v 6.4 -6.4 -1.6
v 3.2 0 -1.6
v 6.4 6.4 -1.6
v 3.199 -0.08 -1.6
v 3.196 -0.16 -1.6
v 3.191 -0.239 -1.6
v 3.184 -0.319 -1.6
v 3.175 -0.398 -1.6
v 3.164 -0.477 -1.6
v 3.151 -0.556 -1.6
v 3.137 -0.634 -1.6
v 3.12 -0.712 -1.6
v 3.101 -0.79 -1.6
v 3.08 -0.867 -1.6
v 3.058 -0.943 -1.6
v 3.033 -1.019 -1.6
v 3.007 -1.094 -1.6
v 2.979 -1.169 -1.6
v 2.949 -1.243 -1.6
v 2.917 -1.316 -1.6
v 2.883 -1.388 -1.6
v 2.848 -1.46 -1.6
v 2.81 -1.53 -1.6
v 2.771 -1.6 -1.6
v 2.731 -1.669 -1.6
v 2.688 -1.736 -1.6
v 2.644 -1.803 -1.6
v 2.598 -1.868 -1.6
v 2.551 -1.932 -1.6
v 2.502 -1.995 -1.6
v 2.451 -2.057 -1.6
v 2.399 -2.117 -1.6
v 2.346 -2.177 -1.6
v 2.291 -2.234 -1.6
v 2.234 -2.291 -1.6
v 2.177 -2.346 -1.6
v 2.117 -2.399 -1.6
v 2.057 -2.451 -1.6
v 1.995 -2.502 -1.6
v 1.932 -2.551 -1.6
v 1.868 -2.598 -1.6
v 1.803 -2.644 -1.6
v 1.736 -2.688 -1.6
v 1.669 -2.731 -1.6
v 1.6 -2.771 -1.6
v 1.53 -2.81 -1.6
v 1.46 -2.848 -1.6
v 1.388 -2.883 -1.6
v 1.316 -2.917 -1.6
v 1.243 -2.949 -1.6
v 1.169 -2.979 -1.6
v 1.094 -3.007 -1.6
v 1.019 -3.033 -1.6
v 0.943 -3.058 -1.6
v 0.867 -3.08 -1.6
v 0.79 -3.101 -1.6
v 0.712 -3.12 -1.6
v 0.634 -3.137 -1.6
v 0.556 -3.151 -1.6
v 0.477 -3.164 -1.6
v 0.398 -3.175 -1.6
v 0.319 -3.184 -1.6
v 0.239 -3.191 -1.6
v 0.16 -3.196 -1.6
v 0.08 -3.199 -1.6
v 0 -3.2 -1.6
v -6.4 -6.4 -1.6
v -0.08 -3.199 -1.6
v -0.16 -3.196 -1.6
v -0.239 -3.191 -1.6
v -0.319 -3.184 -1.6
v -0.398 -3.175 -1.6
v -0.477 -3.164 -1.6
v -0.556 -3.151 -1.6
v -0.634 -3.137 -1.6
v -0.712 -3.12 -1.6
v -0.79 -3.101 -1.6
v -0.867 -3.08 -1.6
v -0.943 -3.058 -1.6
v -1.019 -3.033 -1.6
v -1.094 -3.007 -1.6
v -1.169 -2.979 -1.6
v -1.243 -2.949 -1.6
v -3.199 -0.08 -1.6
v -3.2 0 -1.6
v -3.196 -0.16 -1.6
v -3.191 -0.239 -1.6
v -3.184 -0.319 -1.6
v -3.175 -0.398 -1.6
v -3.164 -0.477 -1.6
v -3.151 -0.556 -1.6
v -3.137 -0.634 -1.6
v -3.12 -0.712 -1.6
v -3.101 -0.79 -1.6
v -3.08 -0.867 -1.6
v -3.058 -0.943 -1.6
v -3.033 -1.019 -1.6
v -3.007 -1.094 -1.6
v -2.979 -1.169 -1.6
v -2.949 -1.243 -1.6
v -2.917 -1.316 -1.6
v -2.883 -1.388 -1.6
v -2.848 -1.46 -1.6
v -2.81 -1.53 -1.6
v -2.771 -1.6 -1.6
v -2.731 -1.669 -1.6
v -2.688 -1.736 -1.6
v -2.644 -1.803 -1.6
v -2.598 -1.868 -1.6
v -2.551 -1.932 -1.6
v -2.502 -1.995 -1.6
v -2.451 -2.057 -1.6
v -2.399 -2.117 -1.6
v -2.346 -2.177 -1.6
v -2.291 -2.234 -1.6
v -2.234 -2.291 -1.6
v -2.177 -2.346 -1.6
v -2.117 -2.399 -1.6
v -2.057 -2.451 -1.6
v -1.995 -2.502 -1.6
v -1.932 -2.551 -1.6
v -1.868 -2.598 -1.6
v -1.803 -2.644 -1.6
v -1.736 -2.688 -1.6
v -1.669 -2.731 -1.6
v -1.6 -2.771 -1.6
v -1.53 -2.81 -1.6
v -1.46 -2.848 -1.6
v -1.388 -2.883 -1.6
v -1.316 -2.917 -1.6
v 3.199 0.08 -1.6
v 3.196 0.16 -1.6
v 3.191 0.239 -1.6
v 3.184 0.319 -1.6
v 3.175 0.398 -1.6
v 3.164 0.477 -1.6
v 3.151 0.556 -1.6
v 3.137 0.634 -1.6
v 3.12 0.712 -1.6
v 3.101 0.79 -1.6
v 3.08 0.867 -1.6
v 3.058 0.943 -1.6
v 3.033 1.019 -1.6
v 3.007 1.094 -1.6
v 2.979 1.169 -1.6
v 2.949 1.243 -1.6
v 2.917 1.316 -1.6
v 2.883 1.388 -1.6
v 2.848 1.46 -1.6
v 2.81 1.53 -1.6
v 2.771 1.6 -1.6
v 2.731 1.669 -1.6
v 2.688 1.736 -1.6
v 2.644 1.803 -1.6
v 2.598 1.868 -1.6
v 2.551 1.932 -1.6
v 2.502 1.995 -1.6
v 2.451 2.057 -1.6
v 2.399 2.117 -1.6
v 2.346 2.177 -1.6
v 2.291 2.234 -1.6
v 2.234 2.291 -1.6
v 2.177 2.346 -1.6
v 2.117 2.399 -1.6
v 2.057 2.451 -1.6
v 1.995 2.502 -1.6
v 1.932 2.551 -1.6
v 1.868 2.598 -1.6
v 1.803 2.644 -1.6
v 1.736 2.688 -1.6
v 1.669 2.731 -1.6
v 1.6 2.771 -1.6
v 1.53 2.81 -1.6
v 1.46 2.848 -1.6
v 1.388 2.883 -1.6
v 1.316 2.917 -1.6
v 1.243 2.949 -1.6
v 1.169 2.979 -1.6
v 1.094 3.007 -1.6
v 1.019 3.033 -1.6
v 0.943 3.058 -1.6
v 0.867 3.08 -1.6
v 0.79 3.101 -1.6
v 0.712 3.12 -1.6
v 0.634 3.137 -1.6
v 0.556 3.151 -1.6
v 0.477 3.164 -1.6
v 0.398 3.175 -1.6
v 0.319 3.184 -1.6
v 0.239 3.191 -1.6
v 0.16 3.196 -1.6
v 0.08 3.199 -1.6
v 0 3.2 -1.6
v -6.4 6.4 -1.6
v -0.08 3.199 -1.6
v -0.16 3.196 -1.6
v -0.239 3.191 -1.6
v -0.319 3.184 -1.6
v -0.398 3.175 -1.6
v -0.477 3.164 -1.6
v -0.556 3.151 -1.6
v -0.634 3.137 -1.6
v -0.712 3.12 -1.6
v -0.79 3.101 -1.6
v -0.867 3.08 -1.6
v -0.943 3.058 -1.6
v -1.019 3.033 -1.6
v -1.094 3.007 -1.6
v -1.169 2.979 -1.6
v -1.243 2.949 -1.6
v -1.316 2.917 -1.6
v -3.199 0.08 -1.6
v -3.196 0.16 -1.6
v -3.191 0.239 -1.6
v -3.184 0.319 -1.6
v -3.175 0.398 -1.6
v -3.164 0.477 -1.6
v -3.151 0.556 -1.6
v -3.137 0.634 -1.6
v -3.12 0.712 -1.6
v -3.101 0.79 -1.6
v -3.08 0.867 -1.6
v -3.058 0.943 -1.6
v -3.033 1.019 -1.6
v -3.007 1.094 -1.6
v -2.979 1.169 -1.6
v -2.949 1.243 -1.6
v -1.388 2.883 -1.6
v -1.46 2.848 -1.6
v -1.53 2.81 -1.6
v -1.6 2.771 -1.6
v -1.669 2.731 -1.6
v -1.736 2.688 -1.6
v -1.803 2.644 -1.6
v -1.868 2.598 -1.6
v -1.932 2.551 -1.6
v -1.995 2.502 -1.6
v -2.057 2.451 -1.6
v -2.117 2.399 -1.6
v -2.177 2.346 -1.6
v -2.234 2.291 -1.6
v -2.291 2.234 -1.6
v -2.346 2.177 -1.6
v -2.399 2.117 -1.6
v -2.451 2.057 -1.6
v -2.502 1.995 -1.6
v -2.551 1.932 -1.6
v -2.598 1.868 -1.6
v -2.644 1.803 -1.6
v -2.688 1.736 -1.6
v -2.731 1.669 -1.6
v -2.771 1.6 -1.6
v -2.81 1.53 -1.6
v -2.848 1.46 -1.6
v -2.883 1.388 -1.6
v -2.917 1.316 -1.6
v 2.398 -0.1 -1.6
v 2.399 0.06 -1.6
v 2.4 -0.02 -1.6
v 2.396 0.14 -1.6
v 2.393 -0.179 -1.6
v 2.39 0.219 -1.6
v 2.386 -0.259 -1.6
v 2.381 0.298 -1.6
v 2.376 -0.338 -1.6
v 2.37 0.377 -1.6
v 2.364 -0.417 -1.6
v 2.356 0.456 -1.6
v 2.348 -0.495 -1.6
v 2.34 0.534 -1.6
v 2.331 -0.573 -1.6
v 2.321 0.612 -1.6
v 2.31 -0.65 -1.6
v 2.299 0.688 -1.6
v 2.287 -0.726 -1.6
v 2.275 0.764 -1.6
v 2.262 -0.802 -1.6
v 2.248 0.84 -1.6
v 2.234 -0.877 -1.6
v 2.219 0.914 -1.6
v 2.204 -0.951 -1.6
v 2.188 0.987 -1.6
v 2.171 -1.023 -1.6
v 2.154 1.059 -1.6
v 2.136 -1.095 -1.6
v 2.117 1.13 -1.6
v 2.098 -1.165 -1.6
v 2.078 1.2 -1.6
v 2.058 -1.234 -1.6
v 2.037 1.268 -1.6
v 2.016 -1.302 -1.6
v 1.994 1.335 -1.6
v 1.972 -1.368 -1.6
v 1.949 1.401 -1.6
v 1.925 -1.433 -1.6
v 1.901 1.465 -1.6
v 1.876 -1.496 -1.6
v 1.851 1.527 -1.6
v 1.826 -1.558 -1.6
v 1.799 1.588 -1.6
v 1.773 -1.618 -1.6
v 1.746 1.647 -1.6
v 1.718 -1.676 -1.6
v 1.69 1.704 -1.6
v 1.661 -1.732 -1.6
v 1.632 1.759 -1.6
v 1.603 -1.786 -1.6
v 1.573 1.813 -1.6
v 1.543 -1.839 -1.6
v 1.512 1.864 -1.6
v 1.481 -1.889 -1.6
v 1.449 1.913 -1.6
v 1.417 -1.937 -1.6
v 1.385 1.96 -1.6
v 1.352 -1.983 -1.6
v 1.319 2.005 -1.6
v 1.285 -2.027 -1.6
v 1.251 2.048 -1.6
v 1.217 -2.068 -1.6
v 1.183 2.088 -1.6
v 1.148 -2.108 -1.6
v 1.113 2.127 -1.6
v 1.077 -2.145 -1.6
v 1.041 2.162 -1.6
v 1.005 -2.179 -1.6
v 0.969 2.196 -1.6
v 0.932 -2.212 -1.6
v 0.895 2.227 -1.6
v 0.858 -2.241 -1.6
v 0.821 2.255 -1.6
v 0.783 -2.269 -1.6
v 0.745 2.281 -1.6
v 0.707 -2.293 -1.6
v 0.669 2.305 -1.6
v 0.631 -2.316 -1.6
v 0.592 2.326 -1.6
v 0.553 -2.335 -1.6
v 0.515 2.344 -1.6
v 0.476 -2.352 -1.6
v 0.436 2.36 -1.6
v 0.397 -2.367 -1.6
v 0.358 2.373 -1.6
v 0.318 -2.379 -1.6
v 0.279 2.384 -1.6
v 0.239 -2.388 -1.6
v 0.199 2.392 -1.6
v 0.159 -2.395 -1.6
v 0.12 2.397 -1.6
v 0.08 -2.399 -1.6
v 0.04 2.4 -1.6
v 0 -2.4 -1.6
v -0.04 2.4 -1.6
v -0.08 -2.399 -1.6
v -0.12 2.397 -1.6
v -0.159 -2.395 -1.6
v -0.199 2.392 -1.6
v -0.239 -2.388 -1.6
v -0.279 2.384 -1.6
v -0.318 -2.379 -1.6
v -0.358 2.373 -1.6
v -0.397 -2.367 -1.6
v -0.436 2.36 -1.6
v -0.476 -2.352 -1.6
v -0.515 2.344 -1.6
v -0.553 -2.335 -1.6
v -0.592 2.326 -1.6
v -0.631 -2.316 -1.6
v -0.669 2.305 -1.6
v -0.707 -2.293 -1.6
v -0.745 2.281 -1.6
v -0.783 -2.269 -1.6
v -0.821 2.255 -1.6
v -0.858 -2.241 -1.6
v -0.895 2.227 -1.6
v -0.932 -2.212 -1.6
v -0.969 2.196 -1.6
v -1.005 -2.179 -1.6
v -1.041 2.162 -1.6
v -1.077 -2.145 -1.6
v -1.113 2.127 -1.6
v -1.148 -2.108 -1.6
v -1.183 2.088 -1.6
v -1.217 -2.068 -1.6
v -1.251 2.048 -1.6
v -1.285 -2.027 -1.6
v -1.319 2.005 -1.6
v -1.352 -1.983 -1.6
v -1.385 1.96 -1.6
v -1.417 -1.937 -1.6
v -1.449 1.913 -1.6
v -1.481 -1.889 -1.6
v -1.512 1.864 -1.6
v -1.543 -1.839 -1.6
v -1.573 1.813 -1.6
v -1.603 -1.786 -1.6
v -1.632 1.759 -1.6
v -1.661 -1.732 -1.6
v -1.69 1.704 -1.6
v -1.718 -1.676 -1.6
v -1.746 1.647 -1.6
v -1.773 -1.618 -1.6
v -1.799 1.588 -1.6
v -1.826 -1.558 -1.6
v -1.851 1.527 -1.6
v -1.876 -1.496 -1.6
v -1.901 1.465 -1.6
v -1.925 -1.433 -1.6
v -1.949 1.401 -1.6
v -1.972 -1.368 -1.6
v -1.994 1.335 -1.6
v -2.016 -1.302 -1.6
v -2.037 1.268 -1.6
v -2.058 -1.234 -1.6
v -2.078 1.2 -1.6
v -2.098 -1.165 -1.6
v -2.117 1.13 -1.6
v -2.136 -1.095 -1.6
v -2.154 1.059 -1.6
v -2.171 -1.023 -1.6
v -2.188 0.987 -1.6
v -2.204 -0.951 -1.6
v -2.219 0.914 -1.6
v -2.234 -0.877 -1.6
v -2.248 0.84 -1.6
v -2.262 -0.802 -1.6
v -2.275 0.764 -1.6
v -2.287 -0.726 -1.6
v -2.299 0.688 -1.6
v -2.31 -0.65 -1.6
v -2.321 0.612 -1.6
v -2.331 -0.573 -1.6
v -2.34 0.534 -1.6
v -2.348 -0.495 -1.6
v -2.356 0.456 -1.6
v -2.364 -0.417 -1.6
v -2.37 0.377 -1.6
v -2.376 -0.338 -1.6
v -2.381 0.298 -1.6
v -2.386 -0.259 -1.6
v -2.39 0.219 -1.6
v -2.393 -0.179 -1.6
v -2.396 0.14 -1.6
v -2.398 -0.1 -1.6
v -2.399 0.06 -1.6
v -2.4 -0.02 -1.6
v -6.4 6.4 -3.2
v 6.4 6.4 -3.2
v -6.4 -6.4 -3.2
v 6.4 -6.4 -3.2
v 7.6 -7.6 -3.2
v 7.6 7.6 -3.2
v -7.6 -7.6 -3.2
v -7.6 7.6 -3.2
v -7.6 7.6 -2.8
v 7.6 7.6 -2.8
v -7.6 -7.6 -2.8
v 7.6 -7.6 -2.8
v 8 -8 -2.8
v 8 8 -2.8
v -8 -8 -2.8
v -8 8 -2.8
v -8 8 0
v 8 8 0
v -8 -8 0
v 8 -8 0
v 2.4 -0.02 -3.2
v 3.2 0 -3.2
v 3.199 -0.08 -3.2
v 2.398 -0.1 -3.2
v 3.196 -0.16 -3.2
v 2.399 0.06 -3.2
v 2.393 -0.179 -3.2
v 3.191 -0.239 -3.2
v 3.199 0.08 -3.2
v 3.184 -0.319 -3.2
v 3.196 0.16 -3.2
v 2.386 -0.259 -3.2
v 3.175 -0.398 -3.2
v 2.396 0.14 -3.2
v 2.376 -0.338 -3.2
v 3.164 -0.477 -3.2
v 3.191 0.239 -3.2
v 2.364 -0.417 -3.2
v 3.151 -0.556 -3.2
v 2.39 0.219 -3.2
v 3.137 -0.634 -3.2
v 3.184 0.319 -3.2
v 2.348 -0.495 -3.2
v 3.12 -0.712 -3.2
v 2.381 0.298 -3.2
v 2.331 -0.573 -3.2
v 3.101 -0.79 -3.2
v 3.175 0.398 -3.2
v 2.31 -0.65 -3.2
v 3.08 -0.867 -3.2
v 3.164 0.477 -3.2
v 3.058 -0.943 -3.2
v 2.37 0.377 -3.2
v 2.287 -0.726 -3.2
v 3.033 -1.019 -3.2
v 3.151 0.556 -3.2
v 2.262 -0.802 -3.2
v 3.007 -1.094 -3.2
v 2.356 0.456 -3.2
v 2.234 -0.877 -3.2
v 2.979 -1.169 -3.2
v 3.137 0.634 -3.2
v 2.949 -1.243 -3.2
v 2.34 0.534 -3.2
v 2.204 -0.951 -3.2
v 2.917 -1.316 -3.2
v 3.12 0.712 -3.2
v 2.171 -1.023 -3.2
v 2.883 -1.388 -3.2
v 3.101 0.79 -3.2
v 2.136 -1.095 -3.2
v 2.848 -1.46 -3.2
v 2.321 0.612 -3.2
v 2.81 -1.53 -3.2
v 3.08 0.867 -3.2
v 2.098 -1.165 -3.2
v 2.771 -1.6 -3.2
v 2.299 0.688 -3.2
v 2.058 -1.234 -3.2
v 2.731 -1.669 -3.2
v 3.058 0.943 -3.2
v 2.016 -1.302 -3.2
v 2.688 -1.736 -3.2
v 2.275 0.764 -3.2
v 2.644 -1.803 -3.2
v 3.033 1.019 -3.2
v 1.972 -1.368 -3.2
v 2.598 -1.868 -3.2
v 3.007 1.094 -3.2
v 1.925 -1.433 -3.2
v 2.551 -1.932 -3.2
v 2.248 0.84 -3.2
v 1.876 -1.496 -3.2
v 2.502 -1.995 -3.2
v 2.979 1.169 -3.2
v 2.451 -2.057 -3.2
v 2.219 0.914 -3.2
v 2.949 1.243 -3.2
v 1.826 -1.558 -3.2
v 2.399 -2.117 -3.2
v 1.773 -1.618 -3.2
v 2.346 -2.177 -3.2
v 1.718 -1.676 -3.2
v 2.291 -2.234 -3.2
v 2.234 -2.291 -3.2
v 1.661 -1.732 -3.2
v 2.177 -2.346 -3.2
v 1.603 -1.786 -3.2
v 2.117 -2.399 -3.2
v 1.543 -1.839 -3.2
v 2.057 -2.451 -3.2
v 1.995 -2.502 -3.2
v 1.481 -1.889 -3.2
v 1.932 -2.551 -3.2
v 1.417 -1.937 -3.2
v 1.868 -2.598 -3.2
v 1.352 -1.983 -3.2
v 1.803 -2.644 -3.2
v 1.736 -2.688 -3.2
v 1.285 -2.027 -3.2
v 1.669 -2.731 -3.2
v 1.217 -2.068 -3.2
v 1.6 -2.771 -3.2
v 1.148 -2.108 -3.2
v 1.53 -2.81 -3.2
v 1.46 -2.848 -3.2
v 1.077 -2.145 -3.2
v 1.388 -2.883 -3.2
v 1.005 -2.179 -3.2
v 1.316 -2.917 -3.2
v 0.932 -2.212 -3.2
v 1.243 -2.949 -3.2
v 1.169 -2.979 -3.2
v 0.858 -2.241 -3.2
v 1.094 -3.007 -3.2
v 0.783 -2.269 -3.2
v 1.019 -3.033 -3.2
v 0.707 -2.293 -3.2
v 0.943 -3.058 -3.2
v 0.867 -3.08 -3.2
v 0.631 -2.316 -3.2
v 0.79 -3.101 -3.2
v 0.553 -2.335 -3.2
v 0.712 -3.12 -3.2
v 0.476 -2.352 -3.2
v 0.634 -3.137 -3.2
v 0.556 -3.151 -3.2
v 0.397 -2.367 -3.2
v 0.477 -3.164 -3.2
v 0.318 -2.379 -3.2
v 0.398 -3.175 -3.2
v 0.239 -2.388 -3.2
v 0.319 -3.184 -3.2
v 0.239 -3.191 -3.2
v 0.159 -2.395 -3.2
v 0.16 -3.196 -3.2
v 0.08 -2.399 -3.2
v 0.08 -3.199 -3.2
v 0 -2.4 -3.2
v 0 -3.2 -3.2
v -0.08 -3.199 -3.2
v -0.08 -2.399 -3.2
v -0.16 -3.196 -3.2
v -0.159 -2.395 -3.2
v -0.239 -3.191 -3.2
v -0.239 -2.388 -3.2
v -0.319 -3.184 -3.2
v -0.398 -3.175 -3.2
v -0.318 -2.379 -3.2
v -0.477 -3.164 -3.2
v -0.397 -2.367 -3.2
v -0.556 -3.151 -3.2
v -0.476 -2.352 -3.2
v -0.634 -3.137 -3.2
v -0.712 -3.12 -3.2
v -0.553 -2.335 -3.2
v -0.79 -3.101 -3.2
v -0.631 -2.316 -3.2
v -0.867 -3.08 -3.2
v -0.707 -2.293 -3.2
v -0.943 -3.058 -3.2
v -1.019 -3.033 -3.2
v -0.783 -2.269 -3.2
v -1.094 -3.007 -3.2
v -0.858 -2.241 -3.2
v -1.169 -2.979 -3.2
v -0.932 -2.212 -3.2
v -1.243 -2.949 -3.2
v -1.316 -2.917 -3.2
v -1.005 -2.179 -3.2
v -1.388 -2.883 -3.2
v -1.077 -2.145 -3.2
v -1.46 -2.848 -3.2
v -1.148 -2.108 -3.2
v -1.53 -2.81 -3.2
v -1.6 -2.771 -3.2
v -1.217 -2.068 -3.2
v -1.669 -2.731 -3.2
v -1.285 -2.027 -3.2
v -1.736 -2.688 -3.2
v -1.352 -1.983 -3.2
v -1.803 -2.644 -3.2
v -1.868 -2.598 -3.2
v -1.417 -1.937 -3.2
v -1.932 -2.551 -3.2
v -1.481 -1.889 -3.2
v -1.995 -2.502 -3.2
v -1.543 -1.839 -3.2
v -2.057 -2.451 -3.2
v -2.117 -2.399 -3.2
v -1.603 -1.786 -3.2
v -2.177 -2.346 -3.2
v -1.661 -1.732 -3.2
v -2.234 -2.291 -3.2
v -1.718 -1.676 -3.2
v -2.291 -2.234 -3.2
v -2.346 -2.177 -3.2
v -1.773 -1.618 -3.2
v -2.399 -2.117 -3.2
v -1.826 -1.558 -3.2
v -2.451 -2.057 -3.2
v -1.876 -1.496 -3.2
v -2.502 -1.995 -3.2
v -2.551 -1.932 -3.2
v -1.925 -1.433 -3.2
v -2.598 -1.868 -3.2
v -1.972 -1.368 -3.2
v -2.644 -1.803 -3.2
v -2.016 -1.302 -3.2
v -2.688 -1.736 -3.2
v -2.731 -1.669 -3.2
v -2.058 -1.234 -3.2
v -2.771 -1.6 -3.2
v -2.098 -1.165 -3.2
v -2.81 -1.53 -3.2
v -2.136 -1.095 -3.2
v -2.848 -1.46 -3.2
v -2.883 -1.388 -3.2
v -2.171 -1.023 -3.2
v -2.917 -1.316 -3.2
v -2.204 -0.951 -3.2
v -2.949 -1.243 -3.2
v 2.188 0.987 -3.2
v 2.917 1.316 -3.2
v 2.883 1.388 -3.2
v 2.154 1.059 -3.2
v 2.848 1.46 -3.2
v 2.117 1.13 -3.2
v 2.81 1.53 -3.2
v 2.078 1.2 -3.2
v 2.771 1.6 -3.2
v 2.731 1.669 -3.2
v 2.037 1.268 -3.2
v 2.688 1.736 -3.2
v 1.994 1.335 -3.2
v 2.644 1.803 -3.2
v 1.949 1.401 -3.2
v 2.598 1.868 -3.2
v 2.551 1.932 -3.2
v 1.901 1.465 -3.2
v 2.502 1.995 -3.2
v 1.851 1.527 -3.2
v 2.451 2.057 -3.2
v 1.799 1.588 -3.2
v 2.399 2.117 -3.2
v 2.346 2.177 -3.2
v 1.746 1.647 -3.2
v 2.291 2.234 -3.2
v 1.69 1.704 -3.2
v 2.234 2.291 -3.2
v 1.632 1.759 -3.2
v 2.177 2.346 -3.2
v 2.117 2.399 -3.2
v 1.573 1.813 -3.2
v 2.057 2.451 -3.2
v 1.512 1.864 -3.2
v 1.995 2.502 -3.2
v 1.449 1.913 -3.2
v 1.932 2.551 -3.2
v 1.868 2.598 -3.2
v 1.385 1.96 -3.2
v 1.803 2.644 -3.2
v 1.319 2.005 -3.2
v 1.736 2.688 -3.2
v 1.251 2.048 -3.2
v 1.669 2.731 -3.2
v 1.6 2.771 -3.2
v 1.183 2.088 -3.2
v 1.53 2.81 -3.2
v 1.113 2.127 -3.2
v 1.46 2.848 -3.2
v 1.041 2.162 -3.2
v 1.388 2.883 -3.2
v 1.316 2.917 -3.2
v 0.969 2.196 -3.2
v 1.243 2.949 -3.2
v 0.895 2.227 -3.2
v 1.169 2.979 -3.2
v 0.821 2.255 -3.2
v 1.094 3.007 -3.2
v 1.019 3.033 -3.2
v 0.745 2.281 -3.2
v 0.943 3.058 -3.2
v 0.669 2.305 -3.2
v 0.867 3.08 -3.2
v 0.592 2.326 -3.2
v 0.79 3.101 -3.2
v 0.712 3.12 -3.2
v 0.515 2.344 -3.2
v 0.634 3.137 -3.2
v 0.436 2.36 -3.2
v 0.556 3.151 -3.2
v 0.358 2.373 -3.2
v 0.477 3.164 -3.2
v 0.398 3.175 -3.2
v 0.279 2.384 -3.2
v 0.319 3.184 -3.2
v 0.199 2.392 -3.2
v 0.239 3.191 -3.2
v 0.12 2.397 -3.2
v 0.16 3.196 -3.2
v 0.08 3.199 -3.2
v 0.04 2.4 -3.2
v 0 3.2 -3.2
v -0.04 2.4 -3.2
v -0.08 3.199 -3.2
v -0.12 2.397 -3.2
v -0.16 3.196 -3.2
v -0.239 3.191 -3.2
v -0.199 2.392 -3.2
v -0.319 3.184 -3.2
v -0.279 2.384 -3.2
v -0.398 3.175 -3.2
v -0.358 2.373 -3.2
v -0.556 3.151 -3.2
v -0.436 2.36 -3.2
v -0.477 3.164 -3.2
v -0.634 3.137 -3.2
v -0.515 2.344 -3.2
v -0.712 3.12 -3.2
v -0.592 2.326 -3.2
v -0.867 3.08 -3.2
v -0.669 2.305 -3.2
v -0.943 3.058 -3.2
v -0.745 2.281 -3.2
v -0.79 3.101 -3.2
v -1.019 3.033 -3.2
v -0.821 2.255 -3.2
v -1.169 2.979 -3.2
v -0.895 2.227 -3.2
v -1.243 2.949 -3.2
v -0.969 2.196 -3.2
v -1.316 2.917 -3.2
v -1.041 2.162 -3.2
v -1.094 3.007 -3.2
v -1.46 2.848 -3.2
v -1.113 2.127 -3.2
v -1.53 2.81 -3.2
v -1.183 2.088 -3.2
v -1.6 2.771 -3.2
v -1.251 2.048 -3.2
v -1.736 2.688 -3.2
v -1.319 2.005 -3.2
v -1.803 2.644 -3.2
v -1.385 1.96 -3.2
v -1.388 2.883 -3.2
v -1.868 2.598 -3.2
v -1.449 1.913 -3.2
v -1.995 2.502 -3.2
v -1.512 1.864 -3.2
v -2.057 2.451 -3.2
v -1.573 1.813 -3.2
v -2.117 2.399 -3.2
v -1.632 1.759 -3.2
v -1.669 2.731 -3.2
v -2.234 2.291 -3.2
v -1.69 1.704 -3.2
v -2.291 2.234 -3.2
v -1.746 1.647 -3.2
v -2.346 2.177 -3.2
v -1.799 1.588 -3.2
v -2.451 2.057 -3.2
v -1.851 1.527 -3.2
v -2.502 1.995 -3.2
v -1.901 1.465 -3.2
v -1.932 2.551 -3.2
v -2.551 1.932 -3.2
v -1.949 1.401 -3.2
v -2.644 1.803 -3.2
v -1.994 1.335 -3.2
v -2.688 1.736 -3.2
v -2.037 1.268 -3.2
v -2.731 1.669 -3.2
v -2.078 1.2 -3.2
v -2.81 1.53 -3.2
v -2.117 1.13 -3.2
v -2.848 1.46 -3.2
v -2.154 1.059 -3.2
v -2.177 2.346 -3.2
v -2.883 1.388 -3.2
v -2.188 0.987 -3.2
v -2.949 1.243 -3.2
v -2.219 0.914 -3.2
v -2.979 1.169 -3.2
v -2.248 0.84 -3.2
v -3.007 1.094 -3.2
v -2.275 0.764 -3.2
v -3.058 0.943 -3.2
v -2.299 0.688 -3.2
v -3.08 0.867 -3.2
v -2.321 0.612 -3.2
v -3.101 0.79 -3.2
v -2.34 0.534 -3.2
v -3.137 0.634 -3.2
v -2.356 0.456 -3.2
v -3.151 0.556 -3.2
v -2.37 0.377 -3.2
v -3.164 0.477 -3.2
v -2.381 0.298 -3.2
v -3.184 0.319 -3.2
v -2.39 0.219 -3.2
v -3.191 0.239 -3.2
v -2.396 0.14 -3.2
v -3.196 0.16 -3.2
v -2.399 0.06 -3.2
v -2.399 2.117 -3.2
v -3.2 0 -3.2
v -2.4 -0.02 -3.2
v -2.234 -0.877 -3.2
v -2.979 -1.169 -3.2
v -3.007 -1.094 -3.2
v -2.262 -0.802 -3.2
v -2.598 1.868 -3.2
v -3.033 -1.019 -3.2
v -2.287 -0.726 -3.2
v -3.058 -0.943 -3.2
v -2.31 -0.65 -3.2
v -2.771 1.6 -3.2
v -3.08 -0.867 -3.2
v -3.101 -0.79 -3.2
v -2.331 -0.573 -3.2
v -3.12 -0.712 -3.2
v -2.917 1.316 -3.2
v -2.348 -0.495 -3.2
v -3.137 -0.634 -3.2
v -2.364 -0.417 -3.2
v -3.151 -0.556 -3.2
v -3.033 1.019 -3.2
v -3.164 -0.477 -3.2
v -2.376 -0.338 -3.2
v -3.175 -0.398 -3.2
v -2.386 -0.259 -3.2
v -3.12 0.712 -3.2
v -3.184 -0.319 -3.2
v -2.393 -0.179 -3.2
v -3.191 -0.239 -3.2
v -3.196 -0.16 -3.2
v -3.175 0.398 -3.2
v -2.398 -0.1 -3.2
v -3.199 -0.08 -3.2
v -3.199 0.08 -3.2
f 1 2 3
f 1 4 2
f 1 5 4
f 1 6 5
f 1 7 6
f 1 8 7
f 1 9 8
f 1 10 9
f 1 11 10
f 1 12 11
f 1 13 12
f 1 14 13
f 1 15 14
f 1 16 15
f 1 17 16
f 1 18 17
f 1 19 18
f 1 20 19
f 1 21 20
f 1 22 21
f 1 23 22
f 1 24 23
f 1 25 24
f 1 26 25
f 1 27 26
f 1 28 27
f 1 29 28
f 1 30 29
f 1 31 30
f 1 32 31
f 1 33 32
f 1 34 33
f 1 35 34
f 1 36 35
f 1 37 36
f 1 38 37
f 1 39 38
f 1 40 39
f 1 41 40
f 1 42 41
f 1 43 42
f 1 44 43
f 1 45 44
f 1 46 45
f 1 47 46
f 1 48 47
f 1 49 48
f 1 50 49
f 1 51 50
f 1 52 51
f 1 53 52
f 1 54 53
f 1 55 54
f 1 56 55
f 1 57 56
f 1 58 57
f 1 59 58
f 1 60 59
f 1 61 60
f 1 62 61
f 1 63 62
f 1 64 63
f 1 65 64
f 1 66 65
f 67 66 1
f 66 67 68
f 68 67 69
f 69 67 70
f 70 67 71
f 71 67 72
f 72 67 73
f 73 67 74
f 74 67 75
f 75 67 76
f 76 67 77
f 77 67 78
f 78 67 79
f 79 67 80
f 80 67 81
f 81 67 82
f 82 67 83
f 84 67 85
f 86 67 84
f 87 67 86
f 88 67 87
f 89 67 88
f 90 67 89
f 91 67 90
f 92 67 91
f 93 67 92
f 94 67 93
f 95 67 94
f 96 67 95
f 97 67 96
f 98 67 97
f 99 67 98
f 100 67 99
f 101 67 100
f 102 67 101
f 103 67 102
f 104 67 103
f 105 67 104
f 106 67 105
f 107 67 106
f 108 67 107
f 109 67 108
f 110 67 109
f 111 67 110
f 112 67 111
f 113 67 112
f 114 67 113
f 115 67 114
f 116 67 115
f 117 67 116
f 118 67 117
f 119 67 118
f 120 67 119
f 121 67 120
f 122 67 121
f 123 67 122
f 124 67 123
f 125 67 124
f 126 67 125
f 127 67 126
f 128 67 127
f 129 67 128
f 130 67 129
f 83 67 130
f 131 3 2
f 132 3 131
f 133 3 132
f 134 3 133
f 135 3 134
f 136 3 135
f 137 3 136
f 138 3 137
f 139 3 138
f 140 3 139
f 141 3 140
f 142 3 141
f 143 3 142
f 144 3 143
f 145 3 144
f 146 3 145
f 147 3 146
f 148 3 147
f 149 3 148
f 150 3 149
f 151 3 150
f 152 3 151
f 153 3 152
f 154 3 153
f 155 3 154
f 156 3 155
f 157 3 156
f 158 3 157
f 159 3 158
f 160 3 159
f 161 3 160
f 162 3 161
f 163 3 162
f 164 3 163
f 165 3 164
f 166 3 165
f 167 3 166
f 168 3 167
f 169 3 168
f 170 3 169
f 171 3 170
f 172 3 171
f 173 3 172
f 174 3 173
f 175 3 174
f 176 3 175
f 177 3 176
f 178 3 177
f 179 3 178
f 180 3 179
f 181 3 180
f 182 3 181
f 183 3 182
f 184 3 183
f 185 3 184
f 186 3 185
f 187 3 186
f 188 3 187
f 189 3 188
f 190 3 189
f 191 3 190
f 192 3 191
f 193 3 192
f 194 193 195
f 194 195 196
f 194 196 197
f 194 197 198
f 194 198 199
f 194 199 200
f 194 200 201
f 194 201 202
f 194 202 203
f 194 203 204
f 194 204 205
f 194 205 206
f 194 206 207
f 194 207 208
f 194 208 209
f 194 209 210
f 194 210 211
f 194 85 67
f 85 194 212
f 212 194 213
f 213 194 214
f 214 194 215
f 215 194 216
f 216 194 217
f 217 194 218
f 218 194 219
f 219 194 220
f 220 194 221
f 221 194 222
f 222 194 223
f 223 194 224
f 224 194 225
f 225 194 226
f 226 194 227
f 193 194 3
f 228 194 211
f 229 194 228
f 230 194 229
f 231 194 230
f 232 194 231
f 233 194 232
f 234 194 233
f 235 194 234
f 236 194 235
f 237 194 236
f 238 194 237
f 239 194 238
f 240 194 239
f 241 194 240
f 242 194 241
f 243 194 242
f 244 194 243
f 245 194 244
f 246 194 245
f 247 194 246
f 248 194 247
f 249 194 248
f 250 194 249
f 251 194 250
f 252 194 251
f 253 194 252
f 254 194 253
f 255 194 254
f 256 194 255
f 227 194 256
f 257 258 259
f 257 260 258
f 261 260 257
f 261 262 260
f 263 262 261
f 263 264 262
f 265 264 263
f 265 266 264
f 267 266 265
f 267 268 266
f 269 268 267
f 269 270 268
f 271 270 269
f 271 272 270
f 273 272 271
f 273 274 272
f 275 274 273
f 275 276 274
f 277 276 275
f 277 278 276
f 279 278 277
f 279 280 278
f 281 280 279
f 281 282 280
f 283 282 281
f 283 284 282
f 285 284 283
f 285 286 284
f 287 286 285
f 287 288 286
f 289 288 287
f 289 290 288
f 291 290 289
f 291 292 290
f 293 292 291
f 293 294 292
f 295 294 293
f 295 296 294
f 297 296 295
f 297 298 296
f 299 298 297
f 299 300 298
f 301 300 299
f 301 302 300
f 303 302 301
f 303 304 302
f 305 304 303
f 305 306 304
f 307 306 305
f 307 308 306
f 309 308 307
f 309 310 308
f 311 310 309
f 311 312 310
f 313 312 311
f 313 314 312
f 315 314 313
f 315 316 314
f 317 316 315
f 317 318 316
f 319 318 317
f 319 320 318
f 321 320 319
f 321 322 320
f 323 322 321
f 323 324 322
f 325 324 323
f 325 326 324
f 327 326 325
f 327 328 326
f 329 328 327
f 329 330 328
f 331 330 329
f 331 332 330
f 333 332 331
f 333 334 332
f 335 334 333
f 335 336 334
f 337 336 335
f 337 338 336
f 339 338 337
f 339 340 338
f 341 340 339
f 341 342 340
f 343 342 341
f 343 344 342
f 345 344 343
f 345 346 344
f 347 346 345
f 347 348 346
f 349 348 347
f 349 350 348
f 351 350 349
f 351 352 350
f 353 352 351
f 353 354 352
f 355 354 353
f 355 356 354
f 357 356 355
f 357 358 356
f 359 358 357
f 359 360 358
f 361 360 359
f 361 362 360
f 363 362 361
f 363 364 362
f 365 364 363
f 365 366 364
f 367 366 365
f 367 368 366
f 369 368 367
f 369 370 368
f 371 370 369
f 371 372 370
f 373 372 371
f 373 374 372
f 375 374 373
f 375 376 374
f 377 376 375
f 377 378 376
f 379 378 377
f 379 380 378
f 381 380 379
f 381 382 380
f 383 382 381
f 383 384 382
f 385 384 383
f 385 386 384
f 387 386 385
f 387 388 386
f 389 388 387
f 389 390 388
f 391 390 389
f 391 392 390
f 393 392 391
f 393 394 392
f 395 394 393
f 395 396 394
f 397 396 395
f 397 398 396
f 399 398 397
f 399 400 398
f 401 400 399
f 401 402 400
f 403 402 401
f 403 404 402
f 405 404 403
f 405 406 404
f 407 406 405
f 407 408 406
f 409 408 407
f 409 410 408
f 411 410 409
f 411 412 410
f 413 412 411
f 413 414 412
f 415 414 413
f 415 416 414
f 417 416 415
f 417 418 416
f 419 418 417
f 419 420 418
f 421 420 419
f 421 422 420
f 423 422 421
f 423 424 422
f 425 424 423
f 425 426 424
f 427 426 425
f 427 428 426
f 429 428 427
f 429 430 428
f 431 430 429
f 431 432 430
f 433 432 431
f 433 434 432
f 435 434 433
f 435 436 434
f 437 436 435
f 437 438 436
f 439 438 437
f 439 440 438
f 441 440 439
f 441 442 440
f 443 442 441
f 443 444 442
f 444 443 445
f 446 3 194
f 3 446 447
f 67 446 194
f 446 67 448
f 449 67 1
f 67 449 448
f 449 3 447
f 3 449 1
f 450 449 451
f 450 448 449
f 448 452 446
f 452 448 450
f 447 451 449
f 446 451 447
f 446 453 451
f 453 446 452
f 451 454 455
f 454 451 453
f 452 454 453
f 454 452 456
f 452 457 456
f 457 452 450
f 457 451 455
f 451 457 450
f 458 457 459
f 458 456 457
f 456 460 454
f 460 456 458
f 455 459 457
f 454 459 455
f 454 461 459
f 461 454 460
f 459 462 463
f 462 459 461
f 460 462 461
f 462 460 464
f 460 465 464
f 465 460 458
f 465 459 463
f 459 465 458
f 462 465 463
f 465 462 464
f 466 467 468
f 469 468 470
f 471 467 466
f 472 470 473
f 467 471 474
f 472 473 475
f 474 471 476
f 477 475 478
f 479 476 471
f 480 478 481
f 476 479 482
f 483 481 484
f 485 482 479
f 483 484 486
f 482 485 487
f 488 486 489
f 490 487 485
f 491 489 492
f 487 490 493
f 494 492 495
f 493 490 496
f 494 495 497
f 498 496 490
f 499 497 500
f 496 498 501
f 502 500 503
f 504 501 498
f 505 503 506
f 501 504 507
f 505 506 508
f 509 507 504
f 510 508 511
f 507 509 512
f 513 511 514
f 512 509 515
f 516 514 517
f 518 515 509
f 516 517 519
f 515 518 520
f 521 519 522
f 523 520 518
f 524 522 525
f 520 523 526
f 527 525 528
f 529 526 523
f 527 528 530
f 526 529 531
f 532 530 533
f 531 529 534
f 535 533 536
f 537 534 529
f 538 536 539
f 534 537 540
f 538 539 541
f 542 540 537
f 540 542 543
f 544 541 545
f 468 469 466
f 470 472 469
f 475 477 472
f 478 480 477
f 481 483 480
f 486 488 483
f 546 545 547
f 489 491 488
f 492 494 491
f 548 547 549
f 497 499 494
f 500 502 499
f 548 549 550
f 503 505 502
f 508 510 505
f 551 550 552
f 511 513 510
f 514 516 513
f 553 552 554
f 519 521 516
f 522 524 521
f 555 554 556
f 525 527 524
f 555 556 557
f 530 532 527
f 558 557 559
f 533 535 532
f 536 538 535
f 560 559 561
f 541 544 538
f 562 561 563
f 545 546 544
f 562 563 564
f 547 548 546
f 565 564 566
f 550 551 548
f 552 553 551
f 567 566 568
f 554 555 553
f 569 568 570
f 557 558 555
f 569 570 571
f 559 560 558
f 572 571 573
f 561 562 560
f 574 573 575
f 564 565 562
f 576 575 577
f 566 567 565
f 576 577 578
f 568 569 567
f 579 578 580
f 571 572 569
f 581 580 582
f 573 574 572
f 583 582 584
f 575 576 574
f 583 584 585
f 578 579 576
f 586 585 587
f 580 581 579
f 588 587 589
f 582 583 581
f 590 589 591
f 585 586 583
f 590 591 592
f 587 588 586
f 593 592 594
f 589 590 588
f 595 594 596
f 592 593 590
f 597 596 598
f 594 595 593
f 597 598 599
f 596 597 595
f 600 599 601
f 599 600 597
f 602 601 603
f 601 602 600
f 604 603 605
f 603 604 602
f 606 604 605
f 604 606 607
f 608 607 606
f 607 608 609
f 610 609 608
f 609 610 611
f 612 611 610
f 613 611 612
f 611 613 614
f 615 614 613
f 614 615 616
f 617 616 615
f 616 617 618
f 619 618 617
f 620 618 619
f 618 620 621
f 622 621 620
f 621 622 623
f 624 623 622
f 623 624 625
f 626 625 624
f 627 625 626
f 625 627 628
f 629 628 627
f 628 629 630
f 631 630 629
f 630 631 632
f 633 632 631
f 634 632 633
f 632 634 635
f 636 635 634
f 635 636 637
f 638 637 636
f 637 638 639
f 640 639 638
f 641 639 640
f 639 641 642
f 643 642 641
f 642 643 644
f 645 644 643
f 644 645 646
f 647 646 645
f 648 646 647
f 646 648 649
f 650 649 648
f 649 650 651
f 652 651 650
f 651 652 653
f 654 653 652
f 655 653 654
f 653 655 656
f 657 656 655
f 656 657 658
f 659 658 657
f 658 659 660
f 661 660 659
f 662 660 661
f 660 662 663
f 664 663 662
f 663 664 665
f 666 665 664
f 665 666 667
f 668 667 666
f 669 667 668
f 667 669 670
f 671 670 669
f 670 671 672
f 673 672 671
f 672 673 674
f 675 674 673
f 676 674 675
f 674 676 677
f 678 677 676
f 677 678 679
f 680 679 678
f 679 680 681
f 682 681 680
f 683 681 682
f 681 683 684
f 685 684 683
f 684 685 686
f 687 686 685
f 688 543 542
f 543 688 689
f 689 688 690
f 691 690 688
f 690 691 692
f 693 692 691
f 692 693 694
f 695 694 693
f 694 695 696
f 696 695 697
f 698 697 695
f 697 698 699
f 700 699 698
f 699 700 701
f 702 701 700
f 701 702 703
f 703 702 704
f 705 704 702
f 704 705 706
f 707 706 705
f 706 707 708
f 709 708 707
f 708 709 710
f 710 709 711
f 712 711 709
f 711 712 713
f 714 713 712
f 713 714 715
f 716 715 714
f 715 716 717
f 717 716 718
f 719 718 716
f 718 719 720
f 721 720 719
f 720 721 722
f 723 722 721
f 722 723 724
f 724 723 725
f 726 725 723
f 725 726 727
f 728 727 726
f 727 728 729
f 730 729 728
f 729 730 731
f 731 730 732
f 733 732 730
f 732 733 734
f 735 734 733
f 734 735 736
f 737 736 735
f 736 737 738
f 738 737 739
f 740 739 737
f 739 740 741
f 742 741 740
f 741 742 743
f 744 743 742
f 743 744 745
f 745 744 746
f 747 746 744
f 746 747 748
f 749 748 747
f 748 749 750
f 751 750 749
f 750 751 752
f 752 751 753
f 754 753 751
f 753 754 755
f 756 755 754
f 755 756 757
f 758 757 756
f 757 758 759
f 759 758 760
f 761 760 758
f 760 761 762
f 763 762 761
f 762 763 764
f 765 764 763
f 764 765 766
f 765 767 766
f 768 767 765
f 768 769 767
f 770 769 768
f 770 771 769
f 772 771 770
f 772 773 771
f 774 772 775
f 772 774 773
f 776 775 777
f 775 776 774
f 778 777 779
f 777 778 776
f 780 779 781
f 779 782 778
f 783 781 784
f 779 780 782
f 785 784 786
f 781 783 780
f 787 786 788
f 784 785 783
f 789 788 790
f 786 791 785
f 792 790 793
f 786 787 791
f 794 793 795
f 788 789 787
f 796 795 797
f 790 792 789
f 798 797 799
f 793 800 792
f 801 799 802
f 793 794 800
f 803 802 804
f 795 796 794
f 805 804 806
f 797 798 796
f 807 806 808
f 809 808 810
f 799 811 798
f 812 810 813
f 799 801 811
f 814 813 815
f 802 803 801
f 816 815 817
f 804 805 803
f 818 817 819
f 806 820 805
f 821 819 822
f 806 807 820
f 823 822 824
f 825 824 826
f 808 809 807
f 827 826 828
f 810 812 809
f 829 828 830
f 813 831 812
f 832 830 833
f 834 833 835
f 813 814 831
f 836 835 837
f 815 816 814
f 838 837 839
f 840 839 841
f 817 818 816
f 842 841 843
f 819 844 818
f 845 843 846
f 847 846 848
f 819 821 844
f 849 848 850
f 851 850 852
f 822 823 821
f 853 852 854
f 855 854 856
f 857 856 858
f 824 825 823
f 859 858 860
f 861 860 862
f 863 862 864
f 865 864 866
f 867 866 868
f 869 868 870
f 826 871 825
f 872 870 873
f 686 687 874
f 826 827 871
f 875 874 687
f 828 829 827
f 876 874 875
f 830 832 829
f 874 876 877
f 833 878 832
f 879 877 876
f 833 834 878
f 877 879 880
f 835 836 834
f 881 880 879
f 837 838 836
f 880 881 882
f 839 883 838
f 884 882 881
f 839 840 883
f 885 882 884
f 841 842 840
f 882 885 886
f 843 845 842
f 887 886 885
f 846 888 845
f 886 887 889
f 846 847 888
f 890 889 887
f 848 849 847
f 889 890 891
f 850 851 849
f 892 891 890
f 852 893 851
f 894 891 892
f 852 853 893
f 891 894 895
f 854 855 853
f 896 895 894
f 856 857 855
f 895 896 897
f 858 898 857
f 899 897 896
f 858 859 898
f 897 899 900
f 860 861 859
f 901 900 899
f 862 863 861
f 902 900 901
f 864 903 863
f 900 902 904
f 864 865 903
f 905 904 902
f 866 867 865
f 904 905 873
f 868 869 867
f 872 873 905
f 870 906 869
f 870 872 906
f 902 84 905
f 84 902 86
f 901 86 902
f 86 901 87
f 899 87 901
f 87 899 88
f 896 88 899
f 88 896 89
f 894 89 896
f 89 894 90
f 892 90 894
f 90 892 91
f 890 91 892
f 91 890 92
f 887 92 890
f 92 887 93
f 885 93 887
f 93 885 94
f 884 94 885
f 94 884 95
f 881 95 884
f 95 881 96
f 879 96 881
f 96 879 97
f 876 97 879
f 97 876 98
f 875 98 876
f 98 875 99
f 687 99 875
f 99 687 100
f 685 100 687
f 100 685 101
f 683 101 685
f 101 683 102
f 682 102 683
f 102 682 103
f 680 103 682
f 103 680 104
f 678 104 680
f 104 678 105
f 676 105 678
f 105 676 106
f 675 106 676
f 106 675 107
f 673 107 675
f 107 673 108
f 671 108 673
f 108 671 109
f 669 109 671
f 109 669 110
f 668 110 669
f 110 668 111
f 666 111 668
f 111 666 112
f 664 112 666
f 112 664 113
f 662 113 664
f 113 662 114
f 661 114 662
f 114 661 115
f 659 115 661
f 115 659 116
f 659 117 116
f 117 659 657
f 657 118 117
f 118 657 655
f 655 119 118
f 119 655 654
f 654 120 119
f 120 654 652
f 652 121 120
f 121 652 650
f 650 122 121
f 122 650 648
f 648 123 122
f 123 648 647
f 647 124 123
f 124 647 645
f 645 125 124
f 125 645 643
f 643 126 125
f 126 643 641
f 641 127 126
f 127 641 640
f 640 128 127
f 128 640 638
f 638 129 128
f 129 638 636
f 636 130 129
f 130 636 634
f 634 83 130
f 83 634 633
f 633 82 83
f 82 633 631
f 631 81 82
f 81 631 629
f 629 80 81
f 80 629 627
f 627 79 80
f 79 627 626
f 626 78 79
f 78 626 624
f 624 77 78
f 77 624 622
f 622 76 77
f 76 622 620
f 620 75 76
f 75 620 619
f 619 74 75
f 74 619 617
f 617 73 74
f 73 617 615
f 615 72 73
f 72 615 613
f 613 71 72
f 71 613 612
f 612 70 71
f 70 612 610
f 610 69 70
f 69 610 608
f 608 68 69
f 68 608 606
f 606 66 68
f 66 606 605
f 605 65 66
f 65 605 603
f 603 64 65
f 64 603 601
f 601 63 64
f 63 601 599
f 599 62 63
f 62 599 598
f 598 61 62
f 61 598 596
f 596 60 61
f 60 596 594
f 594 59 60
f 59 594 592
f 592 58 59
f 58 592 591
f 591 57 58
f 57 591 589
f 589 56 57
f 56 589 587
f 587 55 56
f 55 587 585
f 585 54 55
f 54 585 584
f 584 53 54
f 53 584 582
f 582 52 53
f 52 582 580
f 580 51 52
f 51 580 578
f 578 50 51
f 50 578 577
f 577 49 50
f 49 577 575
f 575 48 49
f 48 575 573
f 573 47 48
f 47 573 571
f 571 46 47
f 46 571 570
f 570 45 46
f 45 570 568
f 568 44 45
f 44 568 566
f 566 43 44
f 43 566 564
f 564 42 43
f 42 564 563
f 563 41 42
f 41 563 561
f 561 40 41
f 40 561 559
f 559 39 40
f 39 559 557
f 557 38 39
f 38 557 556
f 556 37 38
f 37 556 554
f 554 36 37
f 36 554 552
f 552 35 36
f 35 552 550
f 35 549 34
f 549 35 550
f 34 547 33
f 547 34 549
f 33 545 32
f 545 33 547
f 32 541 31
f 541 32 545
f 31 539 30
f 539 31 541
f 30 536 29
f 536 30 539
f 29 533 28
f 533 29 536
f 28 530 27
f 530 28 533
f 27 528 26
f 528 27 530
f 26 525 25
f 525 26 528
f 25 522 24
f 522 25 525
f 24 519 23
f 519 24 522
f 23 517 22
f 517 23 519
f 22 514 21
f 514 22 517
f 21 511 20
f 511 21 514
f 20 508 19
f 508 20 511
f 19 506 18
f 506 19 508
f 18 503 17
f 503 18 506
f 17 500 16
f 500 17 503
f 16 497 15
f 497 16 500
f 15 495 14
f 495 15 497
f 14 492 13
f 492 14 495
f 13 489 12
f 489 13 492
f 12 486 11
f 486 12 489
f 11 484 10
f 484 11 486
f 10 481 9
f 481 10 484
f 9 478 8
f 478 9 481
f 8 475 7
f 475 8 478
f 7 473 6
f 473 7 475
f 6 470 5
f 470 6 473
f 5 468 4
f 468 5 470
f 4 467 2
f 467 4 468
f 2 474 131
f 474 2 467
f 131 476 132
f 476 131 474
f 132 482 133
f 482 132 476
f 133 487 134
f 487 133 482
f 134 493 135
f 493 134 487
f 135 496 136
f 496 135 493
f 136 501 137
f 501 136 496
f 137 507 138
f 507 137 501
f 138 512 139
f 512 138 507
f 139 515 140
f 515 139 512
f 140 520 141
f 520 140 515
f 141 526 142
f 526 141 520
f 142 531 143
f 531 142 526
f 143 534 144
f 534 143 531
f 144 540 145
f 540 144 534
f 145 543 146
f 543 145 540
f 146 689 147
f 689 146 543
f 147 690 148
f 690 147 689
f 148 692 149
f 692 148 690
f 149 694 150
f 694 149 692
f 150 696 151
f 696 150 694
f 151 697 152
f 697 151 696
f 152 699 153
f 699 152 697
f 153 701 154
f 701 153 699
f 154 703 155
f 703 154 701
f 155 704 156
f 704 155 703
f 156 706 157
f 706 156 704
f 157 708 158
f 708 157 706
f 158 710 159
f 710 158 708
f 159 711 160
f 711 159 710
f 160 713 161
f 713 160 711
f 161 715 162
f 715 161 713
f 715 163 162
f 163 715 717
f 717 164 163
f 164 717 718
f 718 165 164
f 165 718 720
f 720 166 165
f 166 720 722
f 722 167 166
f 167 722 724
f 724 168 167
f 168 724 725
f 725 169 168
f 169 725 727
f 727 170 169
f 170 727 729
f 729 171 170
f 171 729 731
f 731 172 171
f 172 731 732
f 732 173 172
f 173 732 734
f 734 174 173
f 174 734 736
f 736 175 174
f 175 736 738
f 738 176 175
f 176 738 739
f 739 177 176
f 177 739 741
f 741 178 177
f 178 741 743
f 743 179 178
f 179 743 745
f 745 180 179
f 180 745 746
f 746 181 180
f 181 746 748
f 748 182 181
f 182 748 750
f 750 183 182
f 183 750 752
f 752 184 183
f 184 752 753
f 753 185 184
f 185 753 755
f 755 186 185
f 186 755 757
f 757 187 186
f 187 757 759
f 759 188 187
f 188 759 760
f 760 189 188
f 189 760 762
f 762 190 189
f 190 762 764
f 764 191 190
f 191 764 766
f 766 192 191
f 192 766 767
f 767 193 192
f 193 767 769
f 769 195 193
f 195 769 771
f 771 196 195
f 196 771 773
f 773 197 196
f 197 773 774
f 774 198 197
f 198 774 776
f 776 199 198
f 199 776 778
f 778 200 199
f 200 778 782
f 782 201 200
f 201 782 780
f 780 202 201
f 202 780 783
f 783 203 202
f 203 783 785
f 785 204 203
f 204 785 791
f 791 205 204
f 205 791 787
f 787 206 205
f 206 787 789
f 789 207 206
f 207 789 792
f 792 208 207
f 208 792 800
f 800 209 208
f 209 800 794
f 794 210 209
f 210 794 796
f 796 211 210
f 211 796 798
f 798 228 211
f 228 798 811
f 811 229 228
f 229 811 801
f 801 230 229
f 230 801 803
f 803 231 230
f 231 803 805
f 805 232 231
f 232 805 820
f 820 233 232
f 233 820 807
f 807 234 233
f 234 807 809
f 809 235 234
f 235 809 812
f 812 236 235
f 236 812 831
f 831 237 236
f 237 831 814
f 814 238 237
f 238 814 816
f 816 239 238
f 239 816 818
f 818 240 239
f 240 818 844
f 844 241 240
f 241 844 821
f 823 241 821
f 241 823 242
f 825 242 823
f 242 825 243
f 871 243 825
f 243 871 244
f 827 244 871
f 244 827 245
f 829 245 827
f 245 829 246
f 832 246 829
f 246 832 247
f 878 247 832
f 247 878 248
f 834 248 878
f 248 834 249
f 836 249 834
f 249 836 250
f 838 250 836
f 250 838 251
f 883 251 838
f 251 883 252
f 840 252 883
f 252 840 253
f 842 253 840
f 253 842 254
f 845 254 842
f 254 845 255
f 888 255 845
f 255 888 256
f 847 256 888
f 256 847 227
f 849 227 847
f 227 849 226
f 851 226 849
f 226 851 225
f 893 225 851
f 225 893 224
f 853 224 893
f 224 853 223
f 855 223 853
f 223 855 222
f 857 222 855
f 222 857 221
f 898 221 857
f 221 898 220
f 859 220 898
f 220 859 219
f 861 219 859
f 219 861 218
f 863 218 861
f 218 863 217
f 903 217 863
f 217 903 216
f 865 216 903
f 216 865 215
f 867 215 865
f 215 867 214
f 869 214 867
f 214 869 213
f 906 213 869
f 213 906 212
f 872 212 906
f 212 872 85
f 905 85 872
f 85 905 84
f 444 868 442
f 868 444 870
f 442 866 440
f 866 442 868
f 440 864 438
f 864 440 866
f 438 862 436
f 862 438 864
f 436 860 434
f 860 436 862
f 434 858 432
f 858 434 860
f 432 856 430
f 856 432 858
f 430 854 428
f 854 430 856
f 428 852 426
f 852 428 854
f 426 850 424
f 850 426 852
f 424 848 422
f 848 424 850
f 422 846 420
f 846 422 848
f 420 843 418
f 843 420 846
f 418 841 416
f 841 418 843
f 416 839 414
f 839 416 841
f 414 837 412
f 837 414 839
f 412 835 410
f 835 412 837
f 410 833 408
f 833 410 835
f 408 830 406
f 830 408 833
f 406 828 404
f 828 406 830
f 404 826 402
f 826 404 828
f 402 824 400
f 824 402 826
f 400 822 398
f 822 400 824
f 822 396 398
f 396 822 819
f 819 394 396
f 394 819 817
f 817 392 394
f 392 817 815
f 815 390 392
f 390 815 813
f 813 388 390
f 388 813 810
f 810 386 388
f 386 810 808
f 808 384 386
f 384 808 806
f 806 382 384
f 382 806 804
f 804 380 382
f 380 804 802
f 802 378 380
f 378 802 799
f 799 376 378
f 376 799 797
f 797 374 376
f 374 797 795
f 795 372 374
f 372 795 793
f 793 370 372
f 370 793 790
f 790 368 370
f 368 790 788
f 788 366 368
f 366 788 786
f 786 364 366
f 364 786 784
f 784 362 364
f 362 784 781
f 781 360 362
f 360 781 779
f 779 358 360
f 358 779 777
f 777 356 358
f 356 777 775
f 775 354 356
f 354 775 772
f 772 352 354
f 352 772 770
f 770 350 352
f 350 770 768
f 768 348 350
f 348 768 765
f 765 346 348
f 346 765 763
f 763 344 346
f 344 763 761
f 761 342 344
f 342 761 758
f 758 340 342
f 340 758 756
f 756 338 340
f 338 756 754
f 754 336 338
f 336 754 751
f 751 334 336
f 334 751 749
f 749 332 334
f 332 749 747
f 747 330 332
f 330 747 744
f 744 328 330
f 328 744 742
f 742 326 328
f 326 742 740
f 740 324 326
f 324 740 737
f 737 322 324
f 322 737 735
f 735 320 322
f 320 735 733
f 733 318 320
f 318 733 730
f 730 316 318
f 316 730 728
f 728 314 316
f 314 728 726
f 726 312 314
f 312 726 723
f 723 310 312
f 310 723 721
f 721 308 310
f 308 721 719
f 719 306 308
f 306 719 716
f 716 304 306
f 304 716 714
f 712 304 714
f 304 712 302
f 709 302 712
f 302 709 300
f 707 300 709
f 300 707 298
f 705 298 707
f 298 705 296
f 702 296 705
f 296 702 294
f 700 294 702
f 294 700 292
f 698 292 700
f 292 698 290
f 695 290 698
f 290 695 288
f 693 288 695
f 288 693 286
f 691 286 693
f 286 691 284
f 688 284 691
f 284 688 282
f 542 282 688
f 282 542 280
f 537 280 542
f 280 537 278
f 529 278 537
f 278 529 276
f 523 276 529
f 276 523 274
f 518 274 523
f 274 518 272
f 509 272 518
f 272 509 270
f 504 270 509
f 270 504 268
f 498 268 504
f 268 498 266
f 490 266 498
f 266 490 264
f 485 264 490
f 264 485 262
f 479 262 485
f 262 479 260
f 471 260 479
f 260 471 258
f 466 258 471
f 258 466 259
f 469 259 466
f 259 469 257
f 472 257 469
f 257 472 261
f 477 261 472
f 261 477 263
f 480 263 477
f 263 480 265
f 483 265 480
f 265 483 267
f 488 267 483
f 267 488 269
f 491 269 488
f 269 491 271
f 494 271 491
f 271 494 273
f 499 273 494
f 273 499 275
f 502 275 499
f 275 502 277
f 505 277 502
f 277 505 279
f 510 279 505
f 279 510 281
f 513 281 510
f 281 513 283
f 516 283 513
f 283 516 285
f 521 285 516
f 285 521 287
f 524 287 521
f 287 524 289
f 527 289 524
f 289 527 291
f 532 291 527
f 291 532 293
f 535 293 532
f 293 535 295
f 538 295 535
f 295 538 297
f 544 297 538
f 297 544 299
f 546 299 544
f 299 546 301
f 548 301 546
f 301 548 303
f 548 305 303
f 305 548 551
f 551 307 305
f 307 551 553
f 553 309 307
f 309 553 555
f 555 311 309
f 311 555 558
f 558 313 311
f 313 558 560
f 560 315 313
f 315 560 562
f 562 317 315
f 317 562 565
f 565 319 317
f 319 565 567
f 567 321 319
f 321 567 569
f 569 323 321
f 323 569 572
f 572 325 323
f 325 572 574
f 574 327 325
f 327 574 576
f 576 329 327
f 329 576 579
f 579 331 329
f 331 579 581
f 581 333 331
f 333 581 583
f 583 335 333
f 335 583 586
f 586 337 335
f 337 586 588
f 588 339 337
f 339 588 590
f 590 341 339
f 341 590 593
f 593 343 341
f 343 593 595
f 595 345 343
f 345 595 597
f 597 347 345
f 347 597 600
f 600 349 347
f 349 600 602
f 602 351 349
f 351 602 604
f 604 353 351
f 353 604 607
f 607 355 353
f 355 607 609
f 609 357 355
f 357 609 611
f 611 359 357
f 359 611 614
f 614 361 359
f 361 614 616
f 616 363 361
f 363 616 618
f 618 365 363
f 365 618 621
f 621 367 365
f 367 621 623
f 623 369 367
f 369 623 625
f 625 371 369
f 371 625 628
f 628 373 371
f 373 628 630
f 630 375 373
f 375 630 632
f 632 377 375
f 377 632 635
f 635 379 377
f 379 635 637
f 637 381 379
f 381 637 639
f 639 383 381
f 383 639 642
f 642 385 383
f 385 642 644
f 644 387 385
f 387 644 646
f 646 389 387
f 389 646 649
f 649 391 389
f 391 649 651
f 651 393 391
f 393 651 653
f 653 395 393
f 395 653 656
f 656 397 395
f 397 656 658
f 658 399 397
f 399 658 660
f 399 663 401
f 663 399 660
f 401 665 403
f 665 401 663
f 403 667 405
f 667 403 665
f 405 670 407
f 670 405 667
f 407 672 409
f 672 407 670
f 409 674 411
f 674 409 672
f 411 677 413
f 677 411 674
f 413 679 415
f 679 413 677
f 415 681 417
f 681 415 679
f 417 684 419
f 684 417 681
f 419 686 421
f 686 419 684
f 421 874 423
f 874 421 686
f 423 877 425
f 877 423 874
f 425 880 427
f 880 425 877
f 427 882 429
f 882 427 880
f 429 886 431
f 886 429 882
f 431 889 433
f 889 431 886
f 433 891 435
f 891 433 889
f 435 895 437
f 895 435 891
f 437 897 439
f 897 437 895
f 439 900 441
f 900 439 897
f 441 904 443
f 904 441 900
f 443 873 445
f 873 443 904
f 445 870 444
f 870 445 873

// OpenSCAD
use <../lib.scad>
use <../p/4-4disc.scad>
use <../p/4-4ndis.scad>
use <s/3068bs01.scad>
$fa=1; $fs=0.2;
function ldraw_lib__3068bp91(realsolid=false) = [
// 0 Tile  2 x  2 with  1 Black Dot Pattern
// 0 Name: 3068bp91.dat
// 0 Author: Philippe Hurbain [Philo]
// 0 !LDRAW_ORG Part UPDATE 2011-01
// 0 !LICENSE Licensed under CC BY 2.0 and CC BY 4.0 : see CAreadme.txt
// 
// 0 BFC CERTIFY CCW
  [0,"BFC","CERTIFY"],
  [0,"BFC","CCW"],
// 
// 0 !KEYWORDS dice, die
// 
// 0 !HISTORY 2011-07-25 [PTadmin] Official Update 2011-01
// 
// 
// 1 16 0 0 0 1 0 0 0 1 0 0 0 1 s\3068bs01.dat
  [1,16,0,0,0,1,0,0,0,1,0,0,0,1, ldraw_lib__s__3068bs01(realsolid)],
// 1 0 0 0 0 4.5 0 0 0 4.5 0 0 0 4.5 4-4disc.dat
  [1,0,0,0,0,4.5,0,0,0,4.5,0,0,0,4.5, ldraw_lib__4_4disc(realsolid)],
// 1 16 0 0 0 4.5 0 0 0 4.5 0 0 0 4.5 4-4ndis.dat
  [1,16,0,0,0,4.5,0,0,0,4.5,0,0,0,4.5, ldraw_lib__4_4ndis(realsolid)],
// 4 16 0 0 -4.5 -4.5 0 -4.5 -20 0 -20 20 0 -20
  [4,16,0,0,-4.5,-4.5,0,-4.5,-20,0,-20,20,0,-20],
// 4 16 -4.5 0 0 -4.5 0 4.5 -20 0 20 -20 0 -20
  [4,16,-4.5,0,0,-4.5,0,4.5,-20,0,20,-20,0,-20],
// 4 16 -20 0 20 0 0 4.5 4.5 0 4.5 20 0 20
  [4,16,-20,0,20,0,0,4.5,4.5,0,4.5,20,0,20],
// 4 16 20 0 20 4.5 0 0 4.5 0 -4.5 20 0 -20
  [4,16,20,0,20,4.5,0,0,4.5,0,-4.5,20,0,-20],
// 3 16 20 0 20 4.5 0 4.5 4.5 0 0
  [3,16,20,0,20,4.5,0,4.5,4.5,0,0],
// 3 16 20 0 -20 4.5 0 -4.5 0 0 -4.5
  [3,16,20,0,-20,4.5,0,-4.5,0,0,-4.5],
// 3 16 -20 0 -20 -4.5 0 -4.5 -4.5 0 0
  [3,16,-20,0,-20,-4.5,0,-4.5,-4.5,0,0],
// 3 16 -20 0 20 -4.5 0 4.5 0 0 4.5
  [3,16,-20,0,20,-4.5,0,4.5,0,0,4.5],
];
module ldraw_lib__3068bp91(step=0, col=false, unit=2/5, alt=false, line=0.2, solid=!$preview)
    makepoly(ldraw_lib__3068bp91(solid), step=step, col=col, unit=unit, alt=alt, line=line, solid=solid);
ldraw_lib__3068bp91(line=0.2);
